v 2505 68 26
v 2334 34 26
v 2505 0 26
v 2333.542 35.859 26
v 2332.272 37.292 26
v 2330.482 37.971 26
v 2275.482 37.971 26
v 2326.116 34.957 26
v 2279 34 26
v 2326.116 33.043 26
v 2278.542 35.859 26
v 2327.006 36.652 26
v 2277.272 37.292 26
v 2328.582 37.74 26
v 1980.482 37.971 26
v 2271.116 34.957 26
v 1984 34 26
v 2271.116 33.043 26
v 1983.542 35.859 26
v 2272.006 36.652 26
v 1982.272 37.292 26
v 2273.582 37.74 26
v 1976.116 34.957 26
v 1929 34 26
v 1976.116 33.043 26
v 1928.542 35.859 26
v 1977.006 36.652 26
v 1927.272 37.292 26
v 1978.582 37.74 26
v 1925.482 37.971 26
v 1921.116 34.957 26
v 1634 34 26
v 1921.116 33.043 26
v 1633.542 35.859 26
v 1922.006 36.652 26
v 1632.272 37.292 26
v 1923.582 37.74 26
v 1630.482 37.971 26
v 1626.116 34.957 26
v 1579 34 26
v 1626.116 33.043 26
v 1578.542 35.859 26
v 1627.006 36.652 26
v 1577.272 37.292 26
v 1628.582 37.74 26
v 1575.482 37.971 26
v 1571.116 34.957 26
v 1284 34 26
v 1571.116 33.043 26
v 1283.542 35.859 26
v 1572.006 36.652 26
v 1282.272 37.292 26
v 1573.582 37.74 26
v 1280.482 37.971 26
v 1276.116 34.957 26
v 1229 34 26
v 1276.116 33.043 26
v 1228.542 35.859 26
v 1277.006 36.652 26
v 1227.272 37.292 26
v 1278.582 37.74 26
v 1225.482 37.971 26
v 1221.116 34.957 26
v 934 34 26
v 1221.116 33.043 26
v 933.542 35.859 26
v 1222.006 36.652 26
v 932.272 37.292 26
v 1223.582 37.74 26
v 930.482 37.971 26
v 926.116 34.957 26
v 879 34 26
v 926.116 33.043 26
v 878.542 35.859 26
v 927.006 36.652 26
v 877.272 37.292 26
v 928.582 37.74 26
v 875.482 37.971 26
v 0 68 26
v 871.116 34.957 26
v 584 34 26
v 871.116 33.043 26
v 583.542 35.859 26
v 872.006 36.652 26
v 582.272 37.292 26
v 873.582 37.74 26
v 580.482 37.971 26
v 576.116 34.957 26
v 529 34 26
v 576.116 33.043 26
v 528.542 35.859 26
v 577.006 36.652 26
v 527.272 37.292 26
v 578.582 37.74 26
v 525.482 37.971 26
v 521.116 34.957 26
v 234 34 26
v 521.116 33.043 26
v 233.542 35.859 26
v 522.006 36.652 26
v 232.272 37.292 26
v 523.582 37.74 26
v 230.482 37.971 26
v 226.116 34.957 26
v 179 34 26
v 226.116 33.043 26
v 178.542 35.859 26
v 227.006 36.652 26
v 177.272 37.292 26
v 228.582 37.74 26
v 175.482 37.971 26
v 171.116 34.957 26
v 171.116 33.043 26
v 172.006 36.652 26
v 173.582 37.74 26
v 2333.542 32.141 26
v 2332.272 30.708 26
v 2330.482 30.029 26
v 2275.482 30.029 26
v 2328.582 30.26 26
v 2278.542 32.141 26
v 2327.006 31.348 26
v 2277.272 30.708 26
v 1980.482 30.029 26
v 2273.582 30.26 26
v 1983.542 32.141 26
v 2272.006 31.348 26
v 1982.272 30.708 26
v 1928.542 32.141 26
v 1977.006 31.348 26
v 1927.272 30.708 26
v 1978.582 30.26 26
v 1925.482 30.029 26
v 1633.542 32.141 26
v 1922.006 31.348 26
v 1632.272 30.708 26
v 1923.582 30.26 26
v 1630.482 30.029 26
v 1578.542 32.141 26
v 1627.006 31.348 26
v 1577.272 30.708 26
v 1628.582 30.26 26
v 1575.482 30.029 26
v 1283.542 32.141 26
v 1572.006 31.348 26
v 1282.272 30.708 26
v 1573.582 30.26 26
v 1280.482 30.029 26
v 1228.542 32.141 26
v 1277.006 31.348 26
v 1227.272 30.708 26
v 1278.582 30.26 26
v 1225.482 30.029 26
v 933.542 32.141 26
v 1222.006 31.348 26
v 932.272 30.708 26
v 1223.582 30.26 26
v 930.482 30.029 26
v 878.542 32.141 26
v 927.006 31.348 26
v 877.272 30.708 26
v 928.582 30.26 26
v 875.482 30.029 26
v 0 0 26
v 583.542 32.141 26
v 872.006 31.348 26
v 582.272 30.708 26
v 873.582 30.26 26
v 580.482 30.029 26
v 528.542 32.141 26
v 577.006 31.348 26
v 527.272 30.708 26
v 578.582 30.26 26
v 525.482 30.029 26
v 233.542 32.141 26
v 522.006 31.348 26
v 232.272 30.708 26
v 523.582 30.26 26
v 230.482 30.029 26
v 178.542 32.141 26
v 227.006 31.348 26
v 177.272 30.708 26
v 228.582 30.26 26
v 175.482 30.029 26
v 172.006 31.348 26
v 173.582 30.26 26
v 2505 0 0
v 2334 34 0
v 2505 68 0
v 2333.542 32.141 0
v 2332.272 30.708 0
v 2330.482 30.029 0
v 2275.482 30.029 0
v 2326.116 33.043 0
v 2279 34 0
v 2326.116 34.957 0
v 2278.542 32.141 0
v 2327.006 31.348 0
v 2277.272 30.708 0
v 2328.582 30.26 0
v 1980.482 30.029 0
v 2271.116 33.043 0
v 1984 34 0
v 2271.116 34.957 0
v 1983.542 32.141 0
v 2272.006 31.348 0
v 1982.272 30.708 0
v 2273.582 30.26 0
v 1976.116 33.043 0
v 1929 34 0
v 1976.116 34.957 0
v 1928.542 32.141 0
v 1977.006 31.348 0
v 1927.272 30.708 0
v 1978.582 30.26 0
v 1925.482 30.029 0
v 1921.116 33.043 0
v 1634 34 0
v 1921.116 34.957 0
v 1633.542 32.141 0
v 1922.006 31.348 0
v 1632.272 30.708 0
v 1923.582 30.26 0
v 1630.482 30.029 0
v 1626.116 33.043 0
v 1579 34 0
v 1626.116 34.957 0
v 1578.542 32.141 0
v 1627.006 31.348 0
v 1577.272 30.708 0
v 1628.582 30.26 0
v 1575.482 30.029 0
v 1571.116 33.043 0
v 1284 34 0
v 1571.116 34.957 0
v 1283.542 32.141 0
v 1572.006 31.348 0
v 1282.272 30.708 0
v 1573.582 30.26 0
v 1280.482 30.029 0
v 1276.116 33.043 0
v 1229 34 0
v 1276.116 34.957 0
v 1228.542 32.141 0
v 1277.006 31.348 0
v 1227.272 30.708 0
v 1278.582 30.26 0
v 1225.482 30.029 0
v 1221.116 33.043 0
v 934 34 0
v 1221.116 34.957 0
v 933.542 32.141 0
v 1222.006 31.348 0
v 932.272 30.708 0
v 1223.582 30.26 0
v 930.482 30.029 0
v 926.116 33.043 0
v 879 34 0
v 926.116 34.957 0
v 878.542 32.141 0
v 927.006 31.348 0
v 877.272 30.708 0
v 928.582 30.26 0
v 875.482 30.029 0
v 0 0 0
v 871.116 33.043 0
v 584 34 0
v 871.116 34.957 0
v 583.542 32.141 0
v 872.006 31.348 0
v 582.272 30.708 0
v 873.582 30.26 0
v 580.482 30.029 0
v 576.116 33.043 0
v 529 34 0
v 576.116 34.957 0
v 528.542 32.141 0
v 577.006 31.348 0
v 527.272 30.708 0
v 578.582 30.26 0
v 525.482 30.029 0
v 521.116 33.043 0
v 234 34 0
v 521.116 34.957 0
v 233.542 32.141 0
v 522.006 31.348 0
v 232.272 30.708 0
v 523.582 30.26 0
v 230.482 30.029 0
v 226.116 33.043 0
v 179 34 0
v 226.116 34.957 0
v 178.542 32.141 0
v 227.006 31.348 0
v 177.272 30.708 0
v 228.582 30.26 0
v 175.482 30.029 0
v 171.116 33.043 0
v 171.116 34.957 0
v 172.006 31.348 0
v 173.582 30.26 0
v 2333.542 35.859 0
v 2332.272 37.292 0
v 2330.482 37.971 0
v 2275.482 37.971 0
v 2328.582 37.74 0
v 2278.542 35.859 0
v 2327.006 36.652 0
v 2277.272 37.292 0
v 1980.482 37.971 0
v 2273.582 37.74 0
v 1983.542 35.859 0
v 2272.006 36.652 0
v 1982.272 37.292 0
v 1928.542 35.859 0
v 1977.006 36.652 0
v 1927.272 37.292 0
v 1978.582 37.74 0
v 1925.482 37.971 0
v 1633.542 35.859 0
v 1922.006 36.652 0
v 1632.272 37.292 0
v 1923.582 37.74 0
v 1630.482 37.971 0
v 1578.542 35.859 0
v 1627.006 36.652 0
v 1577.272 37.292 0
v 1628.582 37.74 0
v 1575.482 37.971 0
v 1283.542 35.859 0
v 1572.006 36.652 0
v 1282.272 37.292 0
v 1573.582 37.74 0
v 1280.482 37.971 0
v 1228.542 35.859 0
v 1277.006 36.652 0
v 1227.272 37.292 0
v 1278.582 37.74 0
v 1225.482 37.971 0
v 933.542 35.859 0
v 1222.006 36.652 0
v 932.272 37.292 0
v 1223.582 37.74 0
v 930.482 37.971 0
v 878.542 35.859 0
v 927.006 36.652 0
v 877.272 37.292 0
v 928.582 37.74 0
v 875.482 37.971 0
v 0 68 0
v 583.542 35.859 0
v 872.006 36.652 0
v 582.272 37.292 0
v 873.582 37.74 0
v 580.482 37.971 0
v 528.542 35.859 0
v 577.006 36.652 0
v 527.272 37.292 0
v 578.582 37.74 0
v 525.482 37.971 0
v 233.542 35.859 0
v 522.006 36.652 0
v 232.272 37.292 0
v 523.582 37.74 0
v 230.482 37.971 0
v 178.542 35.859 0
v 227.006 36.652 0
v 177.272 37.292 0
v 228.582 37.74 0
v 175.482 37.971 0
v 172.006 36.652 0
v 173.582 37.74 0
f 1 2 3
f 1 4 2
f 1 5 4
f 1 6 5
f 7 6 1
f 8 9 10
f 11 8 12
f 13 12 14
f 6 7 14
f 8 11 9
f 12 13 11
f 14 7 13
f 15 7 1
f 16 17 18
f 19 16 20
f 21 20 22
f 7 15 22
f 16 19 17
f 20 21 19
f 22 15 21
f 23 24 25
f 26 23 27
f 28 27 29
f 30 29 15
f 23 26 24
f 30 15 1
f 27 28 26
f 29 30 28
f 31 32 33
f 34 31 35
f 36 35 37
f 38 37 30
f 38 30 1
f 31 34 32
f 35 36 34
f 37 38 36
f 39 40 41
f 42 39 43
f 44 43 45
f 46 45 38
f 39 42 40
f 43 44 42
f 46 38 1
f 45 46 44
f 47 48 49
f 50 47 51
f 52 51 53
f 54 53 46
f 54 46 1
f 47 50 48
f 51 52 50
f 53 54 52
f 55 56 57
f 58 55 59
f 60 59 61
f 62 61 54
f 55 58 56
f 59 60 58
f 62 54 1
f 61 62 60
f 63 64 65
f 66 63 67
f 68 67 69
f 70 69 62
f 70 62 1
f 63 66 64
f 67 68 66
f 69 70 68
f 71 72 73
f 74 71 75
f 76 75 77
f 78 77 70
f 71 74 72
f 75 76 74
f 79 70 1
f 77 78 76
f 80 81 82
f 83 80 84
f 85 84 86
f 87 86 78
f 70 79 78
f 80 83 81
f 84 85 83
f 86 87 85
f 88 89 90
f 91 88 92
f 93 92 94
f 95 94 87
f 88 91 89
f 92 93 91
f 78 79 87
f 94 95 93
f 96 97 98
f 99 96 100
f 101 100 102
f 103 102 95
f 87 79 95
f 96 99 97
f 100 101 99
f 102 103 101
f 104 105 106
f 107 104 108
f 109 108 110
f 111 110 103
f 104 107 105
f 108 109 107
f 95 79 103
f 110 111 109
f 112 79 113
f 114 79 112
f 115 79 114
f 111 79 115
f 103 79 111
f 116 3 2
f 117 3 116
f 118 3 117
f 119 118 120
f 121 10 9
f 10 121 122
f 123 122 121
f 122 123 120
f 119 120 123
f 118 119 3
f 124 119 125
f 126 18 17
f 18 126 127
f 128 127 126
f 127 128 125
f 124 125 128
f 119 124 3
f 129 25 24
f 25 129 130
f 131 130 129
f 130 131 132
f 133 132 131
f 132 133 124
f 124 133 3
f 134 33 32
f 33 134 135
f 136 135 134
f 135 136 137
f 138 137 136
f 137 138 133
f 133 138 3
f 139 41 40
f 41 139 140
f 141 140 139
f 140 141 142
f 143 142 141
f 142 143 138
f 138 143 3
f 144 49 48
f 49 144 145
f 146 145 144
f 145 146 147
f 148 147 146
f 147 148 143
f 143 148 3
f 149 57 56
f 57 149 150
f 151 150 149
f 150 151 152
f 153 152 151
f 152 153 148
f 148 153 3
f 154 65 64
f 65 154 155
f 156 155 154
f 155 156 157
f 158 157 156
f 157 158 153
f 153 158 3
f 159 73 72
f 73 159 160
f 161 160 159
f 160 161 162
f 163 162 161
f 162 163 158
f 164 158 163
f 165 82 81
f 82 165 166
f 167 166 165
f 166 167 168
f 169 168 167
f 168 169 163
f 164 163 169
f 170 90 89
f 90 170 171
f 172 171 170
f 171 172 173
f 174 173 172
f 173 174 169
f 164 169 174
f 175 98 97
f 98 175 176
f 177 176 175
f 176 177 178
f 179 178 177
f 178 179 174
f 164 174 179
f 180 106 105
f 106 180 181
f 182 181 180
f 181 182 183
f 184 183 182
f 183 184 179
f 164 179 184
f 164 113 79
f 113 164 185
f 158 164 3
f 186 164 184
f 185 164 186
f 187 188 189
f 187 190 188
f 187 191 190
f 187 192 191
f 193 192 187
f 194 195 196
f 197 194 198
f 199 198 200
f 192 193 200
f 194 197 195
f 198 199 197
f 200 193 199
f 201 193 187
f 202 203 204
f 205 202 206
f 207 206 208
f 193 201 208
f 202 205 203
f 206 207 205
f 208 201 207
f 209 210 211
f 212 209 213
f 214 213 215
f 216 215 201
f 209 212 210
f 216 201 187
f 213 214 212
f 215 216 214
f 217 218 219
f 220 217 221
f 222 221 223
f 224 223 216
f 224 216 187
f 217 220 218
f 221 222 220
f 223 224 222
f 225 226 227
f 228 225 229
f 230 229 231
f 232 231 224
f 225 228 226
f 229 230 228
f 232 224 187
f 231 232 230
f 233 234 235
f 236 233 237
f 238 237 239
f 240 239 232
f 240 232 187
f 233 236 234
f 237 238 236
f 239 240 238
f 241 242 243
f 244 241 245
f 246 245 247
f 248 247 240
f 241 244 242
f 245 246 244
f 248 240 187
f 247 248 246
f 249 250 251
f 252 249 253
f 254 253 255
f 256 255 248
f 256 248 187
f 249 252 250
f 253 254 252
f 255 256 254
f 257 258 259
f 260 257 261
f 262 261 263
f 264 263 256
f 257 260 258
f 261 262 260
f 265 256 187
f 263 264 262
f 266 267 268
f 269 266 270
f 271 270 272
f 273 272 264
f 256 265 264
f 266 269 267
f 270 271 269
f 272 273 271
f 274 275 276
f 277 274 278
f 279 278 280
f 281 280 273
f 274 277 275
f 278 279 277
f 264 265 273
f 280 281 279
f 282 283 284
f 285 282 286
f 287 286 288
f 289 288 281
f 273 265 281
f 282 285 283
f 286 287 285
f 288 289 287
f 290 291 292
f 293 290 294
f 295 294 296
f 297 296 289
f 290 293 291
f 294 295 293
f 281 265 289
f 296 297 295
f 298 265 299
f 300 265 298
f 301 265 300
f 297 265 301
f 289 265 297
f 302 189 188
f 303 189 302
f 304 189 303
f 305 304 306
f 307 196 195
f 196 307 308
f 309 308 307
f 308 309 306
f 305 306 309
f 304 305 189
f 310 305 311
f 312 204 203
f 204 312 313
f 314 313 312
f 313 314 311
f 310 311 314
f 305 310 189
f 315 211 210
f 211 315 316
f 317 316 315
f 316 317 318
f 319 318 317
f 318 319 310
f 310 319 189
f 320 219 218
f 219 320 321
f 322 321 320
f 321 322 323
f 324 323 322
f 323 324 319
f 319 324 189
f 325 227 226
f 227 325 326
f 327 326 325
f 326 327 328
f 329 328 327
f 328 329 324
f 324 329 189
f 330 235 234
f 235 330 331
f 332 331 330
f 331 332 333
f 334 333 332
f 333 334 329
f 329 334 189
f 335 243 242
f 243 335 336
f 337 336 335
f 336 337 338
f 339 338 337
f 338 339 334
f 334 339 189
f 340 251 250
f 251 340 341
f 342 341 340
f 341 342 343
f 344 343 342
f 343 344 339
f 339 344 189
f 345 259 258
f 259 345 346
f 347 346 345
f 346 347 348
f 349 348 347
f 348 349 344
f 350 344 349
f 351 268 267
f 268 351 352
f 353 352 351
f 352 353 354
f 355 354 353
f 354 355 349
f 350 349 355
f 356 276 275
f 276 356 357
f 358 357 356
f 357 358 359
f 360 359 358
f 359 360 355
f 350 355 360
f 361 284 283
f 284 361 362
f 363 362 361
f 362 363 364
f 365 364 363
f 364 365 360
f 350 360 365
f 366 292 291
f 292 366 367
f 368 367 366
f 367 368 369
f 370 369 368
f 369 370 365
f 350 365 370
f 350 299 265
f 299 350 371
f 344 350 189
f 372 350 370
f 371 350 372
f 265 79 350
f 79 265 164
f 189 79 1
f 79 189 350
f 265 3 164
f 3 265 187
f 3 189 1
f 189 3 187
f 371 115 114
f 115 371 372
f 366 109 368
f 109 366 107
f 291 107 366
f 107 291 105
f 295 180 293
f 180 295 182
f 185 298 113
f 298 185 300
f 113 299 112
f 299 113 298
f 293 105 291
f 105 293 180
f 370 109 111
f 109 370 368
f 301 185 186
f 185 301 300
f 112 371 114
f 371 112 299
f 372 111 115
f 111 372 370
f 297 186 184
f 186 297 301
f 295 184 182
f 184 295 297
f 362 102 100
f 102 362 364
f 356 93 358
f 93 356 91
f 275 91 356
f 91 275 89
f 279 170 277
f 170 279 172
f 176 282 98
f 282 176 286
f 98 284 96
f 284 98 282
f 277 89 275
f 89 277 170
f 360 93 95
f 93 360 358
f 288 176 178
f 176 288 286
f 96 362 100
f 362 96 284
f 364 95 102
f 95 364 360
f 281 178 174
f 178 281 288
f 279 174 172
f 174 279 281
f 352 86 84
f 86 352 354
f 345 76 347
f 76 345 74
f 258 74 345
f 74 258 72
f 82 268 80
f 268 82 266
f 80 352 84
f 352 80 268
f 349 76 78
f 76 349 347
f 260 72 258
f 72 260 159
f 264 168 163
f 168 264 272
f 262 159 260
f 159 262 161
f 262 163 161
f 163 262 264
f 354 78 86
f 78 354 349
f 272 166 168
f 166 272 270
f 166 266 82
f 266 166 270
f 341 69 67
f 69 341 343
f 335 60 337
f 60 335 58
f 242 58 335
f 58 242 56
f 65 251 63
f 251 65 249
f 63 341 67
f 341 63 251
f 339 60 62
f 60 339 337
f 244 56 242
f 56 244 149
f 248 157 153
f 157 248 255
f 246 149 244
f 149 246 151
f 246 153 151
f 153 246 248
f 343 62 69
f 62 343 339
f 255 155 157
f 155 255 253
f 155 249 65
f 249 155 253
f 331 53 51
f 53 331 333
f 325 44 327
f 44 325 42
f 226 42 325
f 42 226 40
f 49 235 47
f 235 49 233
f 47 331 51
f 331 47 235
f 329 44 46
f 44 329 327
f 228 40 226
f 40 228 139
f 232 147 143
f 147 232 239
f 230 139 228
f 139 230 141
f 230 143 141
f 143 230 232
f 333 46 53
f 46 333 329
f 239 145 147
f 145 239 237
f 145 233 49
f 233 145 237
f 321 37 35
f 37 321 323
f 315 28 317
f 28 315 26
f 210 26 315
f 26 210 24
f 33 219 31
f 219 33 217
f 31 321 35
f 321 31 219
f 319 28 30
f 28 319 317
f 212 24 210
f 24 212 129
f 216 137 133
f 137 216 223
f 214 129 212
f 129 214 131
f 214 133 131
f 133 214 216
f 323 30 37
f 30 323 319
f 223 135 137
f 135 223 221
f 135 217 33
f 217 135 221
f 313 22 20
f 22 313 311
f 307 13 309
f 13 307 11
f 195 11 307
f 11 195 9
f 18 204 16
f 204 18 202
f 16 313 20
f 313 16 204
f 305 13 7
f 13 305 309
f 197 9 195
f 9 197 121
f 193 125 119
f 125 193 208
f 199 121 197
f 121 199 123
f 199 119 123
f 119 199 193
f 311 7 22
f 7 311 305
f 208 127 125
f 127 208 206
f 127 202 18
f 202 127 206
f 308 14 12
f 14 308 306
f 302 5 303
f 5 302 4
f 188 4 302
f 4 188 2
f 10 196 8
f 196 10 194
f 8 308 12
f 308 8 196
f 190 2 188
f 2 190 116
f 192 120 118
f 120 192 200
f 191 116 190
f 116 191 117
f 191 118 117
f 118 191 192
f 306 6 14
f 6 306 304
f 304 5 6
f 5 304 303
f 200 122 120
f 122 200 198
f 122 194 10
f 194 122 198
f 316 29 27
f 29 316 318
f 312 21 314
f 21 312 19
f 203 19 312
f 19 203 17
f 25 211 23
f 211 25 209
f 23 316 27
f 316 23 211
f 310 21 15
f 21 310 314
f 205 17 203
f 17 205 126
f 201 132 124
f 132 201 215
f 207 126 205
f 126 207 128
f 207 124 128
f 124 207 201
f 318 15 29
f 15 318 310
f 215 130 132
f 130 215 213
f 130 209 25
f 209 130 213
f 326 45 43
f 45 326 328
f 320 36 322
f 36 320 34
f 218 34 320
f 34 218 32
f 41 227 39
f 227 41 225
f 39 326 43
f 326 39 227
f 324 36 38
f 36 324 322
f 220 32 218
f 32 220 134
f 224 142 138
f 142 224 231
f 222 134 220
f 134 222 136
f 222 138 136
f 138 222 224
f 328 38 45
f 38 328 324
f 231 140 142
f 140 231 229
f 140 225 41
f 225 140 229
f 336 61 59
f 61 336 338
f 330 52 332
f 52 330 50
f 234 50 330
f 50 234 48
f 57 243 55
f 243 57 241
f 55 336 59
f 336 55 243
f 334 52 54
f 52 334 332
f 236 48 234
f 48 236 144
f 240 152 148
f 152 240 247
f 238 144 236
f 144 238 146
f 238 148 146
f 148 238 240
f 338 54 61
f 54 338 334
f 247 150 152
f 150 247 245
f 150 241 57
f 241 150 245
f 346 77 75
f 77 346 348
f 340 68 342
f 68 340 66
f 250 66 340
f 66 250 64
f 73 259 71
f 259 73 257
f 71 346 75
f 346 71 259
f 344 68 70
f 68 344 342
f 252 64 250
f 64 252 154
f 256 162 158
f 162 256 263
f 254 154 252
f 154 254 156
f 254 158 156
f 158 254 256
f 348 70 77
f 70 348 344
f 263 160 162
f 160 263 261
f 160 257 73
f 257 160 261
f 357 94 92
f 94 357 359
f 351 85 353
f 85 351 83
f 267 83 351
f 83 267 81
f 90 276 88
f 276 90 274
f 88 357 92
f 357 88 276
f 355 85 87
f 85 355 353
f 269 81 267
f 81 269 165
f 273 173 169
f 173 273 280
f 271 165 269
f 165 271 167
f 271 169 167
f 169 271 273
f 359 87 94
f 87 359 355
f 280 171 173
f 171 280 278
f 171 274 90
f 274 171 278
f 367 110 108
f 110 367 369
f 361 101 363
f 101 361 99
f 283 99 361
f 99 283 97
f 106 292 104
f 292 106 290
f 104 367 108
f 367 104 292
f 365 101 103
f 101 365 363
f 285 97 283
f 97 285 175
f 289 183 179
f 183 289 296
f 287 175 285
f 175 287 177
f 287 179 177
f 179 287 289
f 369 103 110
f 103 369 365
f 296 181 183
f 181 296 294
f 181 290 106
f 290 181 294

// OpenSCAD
module teljes_lec(){
    cube([1805, 68,26]);
    color([1,0,0])translate([1805,0,0])cube([700,68,26]);
}

difference(){
    teljes_lec();
    for(x = [175:350:2500]){
       #translate([x, 34, -1]) cylinder(r=4, h=30);
        echo(x);
    }
    for(x = [2505-175:-350:00]){
       #translate([x, 34, -1]) cylinder(r=4, h=30);
        echo(x);
    }
}
